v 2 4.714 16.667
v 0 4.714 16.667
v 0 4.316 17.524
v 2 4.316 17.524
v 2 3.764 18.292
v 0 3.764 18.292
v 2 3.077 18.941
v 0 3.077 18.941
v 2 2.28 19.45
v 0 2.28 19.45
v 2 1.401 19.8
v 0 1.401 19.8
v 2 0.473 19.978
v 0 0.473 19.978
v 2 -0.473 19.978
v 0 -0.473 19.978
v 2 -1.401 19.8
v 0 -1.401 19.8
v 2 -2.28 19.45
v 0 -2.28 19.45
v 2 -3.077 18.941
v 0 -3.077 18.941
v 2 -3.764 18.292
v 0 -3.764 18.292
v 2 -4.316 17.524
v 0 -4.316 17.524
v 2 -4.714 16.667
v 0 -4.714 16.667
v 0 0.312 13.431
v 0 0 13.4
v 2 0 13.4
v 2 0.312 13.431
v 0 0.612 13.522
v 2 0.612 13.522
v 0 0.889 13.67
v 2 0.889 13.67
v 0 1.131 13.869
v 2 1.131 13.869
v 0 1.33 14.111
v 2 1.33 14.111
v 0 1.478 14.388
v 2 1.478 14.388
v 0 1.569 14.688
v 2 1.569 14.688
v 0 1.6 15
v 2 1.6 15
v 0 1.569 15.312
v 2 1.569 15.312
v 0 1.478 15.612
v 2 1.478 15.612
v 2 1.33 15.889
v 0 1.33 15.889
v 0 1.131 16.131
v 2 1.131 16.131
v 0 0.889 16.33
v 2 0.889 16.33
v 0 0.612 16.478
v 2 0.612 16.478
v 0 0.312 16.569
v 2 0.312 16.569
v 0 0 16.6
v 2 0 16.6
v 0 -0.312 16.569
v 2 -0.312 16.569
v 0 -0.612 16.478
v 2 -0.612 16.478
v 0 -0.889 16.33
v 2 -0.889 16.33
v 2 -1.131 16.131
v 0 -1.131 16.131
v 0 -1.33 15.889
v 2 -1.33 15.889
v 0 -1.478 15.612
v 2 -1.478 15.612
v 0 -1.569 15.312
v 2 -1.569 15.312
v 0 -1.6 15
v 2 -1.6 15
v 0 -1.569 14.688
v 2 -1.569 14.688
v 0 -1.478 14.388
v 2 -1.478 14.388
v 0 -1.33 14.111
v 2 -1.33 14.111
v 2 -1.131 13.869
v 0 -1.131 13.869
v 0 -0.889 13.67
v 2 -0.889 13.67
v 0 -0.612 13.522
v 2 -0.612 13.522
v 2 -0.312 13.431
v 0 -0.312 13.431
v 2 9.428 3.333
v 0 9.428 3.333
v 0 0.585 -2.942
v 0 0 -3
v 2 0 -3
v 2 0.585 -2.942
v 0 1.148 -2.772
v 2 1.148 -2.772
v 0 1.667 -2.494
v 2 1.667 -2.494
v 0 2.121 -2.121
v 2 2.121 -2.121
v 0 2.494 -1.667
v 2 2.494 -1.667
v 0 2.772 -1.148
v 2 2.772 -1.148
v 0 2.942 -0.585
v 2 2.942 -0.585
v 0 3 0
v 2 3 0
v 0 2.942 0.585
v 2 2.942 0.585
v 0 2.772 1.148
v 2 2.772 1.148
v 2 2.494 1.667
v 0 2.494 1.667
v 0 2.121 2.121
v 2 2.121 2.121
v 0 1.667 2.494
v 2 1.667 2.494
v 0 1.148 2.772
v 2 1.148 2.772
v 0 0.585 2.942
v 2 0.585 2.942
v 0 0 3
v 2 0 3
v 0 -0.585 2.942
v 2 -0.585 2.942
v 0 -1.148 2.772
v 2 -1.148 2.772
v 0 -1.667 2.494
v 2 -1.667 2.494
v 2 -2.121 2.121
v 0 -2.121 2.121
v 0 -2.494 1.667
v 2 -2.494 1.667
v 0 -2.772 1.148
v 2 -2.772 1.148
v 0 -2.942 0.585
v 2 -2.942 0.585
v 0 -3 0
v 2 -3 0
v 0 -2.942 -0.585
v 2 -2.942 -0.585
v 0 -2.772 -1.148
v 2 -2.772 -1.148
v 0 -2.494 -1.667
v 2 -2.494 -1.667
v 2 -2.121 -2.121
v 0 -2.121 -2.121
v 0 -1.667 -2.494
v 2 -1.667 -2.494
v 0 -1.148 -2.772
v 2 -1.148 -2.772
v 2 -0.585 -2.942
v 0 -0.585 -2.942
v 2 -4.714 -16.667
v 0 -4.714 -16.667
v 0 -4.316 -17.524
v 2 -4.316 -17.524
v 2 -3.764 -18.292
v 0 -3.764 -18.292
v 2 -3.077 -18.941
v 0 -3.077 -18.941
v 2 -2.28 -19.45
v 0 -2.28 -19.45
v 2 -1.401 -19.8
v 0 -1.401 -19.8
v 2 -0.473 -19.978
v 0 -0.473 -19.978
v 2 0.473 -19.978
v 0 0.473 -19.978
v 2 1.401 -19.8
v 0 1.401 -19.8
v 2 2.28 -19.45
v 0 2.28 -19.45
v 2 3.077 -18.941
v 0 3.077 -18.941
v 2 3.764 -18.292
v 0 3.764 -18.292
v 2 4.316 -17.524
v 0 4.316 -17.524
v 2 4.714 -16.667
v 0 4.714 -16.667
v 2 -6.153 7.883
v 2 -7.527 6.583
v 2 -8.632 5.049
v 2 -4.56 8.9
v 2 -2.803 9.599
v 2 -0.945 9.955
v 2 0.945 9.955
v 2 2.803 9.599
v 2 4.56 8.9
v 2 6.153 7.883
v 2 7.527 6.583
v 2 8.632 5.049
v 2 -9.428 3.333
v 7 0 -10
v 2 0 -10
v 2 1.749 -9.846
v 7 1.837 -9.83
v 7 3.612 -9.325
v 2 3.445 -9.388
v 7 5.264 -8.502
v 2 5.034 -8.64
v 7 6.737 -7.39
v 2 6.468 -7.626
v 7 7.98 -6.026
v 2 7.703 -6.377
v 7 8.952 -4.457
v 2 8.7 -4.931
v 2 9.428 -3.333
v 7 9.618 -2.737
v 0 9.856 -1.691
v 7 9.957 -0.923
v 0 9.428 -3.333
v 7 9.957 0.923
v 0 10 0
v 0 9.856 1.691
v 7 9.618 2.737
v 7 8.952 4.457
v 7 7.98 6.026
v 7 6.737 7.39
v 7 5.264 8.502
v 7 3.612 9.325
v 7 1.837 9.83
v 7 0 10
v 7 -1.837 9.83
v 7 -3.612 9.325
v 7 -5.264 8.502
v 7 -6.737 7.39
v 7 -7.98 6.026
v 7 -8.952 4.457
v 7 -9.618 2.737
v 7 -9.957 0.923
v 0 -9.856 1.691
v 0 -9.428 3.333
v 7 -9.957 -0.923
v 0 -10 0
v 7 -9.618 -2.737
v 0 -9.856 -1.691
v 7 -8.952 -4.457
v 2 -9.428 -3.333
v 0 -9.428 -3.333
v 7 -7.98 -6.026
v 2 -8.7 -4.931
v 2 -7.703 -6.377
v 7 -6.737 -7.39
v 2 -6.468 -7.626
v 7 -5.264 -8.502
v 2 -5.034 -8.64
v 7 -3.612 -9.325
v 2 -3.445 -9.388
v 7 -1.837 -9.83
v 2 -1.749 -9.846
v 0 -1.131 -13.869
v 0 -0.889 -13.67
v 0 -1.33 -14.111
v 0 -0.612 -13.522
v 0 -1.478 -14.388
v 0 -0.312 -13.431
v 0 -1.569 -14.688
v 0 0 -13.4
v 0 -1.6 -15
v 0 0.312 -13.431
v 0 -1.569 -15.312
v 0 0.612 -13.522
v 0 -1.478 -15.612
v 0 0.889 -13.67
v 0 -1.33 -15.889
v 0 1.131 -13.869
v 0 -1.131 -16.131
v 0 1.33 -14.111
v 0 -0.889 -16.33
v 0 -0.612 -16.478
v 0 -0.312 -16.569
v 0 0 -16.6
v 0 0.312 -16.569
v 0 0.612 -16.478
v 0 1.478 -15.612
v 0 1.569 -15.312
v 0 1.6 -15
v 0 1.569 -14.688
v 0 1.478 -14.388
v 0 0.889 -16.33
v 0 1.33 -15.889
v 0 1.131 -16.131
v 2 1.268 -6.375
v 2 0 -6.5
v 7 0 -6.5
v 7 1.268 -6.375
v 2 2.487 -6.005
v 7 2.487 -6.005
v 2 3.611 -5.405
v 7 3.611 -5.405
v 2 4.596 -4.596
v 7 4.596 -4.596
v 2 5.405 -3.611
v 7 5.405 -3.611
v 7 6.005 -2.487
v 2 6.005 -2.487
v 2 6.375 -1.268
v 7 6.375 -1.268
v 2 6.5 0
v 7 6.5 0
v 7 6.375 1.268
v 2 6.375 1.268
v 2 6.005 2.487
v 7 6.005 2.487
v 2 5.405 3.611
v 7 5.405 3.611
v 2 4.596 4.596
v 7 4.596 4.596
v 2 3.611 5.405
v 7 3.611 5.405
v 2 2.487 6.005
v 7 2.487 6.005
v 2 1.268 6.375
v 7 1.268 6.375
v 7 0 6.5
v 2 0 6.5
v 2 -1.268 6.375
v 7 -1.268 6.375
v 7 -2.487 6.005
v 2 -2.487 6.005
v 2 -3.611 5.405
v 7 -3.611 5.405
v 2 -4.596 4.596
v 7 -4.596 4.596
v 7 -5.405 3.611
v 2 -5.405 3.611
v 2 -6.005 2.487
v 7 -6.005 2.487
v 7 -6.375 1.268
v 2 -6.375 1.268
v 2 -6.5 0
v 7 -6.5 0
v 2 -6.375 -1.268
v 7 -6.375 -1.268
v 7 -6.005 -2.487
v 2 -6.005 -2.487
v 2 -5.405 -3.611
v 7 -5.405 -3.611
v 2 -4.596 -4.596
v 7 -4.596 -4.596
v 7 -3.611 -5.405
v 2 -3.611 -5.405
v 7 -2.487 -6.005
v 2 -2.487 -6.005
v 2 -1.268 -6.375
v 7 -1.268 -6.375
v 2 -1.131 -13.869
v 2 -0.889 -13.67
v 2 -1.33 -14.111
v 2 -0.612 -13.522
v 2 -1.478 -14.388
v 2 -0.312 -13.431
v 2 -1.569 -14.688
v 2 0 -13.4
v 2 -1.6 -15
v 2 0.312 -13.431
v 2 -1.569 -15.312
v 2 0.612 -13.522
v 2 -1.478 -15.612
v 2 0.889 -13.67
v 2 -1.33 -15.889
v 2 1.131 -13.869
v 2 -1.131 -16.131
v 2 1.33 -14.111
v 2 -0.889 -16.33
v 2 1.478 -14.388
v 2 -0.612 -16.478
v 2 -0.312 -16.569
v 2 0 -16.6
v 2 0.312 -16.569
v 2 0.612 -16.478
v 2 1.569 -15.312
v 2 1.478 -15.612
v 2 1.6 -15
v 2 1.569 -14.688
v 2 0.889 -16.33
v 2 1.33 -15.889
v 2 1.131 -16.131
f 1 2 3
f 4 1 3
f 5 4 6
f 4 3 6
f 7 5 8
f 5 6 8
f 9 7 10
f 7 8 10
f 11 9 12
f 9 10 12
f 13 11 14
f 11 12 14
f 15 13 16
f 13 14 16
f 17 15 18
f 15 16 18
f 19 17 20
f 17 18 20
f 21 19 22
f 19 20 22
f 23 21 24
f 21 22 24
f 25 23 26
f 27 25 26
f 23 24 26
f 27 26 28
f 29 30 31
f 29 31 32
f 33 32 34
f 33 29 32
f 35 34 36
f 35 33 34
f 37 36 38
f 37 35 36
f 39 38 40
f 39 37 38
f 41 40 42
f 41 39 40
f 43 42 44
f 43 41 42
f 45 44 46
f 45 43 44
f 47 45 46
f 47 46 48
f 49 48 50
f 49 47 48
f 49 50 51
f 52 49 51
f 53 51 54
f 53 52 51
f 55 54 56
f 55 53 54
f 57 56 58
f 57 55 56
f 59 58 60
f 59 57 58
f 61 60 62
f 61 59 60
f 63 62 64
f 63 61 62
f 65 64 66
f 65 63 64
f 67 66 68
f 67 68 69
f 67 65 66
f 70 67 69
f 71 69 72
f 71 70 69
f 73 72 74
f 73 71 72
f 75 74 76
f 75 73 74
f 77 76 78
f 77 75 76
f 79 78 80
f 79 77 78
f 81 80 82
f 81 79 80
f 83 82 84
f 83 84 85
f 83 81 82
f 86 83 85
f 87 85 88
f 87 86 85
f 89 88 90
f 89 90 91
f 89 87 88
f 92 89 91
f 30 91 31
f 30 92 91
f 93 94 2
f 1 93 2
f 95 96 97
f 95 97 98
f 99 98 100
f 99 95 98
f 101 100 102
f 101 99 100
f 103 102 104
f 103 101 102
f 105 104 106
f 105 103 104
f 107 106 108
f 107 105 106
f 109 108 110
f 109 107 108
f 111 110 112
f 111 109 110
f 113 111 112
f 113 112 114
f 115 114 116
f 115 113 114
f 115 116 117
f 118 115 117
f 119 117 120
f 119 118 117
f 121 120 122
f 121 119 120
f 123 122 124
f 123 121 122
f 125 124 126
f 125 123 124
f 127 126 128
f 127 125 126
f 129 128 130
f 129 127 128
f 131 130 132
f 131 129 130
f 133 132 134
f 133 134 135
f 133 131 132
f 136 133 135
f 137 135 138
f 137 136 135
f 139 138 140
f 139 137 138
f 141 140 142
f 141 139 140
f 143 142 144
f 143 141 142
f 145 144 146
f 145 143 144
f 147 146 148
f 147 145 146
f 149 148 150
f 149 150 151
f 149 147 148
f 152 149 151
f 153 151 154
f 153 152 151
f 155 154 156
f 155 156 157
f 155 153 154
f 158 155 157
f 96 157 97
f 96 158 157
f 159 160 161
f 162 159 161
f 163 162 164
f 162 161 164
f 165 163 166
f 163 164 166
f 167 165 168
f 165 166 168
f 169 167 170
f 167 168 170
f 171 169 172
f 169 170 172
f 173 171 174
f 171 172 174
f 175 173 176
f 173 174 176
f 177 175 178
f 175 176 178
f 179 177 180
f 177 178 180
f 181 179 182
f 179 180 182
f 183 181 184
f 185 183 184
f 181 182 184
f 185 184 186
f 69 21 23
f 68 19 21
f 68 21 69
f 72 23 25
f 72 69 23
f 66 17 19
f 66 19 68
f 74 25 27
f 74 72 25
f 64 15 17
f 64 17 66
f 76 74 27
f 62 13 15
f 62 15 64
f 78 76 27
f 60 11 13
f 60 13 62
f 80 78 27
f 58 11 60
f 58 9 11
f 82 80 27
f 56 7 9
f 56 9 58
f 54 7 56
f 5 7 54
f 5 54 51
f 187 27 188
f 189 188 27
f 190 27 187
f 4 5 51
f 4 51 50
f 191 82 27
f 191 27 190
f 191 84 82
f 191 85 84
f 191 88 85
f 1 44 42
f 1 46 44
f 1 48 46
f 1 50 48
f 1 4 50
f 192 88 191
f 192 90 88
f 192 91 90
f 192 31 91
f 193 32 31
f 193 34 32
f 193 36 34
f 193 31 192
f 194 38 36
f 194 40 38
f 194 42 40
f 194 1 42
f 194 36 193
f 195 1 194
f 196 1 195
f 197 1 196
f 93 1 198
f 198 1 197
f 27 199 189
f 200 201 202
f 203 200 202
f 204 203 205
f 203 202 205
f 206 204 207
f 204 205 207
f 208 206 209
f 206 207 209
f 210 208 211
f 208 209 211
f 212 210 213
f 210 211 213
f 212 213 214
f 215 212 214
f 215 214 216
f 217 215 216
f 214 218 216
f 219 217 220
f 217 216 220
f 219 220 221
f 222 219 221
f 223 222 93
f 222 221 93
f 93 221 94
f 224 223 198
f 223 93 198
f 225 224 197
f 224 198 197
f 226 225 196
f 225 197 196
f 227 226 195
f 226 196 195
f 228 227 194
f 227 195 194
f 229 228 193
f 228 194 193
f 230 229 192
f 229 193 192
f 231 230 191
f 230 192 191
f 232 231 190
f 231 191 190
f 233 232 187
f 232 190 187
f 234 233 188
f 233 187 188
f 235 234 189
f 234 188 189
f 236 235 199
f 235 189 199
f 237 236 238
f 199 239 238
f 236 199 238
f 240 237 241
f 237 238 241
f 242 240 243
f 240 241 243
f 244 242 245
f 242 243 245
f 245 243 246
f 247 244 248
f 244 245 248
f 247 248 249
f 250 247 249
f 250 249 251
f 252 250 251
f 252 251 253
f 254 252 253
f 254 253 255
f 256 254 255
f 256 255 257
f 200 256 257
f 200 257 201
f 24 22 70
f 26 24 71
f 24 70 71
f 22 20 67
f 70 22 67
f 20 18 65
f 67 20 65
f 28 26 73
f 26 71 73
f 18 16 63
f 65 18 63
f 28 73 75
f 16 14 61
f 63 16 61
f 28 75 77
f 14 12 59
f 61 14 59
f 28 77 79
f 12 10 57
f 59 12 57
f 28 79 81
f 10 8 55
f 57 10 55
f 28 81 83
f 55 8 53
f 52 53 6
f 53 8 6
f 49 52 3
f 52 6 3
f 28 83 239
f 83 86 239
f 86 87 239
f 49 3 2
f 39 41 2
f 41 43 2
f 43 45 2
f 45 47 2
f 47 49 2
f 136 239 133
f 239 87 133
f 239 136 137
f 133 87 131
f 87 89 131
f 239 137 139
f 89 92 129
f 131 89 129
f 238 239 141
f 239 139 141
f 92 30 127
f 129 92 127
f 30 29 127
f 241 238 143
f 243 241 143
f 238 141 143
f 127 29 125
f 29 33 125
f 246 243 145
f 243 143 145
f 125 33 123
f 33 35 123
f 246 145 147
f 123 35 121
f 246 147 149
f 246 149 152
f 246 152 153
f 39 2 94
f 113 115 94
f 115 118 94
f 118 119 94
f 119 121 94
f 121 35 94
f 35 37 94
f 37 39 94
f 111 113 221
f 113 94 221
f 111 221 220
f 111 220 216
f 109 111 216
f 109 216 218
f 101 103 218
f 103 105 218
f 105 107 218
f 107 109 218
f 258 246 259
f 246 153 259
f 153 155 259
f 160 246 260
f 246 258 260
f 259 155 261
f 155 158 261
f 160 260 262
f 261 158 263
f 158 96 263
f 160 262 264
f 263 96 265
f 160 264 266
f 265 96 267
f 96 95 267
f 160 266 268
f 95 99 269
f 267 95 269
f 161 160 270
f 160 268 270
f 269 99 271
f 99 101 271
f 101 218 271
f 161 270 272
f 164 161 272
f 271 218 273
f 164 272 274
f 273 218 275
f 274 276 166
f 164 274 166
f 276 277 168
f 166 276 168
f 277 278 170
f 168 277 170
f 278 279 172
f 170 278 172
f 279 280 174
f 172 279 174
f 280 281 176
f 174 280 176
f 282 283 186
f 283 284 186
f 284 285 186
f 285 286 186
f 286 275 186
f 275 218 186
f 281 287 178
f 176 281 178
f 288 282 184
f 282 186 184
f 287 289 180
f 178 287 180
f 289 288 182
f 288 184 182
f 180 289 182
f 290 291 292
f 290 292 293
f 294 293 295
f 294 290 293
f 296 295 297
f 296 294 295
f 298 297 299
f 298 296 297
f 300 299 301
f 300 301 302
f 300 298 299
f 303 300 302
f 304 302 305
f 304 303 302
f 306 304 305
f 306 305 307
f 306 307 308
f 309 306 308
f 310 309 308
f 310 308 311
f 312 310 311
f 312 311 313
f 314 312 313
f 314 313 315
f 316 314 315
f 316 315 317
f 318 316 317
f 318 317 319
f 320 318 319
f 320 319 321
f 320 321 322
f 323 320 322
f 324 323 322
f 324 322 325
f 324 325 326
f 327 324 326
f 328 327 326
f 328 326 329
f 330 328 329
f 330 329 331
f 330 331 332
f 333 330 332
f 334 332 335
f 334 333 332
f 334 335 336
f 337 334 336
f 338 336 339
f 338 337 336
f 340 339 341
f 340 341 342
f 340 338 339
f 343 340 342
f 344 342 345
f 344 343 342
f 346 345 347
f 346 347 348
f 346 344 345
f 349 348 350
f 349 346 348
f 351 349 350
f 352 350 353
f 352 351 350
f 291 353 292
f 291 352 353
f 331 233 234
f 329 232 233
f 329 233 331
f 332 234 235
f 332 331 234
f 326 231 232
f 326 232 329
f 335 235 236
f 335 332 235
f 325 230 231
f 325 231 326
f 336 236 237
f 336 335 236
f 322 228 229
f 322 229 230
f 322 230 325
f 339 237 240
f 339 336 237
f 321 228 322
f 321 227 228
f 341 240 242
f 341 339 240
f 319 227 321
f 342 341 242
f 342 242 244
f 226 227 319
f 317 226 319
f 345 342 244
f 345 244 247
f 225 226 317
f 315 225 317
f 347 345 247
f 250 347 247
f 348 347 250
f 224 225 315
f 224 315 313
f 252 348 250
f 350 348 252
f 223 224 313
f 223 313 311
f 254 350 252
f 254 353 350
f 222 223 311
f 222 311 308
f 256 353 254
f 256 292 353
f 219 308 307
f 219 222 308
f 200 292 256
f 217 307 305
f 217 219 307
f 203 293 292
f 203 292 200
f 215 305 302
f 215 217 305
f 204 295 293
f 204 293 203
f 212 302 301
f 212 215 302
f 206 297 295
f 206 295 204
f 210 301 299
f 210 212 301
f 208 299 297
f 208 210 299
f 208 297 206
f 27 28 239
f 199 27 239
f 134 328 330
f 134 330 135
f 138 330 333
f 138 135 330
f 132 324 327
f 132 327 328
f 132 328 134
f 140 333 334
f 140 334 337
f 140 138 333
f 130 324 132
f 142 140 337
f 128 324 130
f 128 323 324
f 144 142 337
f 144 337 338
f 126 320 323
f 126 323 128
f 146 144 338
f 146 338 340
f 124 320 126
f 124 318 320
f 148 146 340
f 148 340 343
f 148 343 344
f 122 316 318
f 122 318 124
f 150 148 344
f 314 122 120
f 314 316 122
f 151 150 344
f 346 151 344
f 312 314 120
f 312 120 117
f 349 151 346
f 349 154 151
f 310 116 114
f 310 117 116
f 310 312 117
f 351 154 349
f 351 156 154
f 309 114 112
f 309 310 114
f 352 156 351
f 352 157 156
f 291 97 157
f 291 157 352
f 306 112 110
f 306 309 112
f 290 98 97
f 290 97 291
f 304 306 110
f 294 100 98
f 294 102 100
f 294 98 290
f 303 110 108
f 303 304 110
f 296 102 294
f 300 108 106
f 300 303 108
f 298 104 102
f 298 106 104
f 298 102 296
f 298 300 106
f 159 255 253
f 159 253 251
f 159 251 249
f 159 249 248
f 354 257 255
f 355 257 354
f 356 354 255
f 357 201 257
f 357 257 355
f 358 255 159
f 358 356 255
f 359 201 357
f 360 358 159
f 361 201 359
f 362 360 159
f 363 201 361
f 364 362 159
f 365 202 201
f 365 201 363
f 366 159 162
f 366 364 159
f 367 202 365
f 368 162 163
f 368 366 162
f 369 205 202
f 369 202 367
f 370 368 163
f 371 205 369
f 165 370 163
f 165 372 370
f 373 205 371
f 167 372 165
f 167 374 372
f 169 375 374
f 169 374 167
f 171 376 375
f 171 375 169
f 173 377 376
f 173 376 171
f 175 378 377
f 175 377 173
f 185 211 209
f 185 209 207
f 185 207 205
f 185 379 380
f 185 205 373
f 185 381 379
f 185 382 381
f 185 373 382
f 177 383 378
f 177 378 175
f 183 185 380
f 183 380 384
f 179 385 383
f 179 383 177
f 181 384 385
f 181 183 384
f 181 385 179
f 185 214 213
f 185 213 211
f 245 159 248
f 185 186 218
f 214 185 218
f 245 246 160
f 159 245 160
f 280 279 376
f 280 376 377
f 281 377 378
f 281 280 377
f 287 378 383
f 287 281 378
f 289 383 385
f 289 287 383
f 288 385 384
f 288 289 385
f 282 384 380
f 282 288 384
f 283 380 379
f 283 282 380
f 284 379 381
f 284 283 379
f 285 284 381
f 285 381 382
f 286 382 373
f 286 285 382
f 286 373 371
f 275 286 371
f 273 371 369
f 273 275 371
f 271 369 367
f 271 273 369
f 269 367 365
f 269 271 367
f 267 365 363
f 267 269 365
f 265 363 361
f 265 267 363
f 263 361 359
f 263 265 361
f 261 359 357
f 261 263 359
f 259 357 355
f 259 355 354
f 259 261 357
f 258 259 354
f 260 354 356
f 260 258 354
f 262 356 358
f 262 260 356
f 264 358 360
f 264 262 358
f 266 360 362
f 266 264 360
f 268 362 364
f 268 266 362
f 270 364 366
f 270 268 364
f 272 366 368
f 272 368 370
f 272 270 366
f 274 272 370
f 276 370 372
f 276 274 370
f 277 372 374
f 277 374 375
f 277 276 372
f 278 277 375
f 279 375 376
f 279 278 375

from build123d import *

# Parameters (mm, degrees)
SKETCH1_R             = 1.6
BOSS_EXTRUDE1_DEPTH   = 2
BOSS_EXTRUDE1_2_DEPTH = 2
SKETCH1_5_R           = 10
SKETCH1_5_R_2         = 6.5
BOSS_EXTRUDE2_DEPTH   = 7
SKETCH1_6_R           = 6.5
SKETCH1_6_R_2         = 3
BOSS_EXTRUDE3_DEPTH   = 2


with BuildPart() as part:
    # Sketch1 → Boss-Extrude1 (new body)
    with BuildSketch(Plane(origin=(0, 0, 0), x_dir=(0, 0, -1), z_dir=(1, 0, 0))):
        with BuildLine():
            Line((-3.333333333, 9.428090416), (-16.666666667, 4.714045208))
            ThreePointArc((-16.666666667, 4.714045208), (-20, 0), (-16.666666667, -4.714045208))
            Line((-16.666666667, -4.714045208), (-3.333333333, -9.428090416))
            ThreePointArc((-3.333333333, -9.428090416), (-10, 0), (-3.333333333, 9.428090416))
        make_face()
        with Locations((-15, 0)):
            Circle(SKETCH1_R, mode=Mode.SUBTRACT)
    extrude(amount=BOSS_EXTRUDE1_DEPTH)



with BuildPart() as body_2:
    # Sketch1 → Boss-Extrude1 2 (new body)
    with BuildSketch(Plane(origin=(0, 0, 0), x_dir=(0, 0, -1), z_dir=(1, 0, 0))):
        with BuildLine():
            Line((16.666666667, 4.714045208), (3.333333333, 9.428090416))
            ThreePointArc((3.333333333, 9.428090416), (8.164965809, 5.773502692), (10, 0))
            ThreePointArc((10, 0), (8.164965809, -5.773502692), (3.333333333, -9.428090416))
            Line((3.333333333, -9.428090416), (16.666666667, -4.714045208))
            ThreePointArc((16.666666667, -4.714045208), (20, 0), (16.666666667, 4.714045208))
        make_face()
        with Locations((15, 0)):
            Circle(SKETCH1_R, mode=Mode.SUBTRACT)
    extrude(amount=BOSS_EXTRUDE1_2_DEPTH)


with BuildPart() as part_1:
    add(part.part)

    add(body_2.part)  # Boss-Extrude2 merges body 2
    # Sketch1<5> → Boss-Extrude2 (add)
    with BuildSketch(Plane(origin=(0, 0, 0), x_dir=(0, 0, -1), z_dir=(1, 0, 0))):
        Circle(SKETCH1_5_R)
        Circle(SKETCH1_5_R_2, mode=Mode.SUBTRACT)
    extrude(amount=BOSS_EXTRUDE2_DEPTH)

    # Sketch1<6> → Boss-Extrude3 (add)
    with BuildSketch(Plane(origin=(0, 0, 0), x_dir=(0, 0, -1), z_dir=(1, 0, 0))):
        Circle(SKETCH1_6_R)
        Circle(SKETCH1_6_R_2, mode=Mode.SUBTRACT)
    extrude(amount=BOSS_EXTRUDE3_DEPTH)


solid = part_1.part
